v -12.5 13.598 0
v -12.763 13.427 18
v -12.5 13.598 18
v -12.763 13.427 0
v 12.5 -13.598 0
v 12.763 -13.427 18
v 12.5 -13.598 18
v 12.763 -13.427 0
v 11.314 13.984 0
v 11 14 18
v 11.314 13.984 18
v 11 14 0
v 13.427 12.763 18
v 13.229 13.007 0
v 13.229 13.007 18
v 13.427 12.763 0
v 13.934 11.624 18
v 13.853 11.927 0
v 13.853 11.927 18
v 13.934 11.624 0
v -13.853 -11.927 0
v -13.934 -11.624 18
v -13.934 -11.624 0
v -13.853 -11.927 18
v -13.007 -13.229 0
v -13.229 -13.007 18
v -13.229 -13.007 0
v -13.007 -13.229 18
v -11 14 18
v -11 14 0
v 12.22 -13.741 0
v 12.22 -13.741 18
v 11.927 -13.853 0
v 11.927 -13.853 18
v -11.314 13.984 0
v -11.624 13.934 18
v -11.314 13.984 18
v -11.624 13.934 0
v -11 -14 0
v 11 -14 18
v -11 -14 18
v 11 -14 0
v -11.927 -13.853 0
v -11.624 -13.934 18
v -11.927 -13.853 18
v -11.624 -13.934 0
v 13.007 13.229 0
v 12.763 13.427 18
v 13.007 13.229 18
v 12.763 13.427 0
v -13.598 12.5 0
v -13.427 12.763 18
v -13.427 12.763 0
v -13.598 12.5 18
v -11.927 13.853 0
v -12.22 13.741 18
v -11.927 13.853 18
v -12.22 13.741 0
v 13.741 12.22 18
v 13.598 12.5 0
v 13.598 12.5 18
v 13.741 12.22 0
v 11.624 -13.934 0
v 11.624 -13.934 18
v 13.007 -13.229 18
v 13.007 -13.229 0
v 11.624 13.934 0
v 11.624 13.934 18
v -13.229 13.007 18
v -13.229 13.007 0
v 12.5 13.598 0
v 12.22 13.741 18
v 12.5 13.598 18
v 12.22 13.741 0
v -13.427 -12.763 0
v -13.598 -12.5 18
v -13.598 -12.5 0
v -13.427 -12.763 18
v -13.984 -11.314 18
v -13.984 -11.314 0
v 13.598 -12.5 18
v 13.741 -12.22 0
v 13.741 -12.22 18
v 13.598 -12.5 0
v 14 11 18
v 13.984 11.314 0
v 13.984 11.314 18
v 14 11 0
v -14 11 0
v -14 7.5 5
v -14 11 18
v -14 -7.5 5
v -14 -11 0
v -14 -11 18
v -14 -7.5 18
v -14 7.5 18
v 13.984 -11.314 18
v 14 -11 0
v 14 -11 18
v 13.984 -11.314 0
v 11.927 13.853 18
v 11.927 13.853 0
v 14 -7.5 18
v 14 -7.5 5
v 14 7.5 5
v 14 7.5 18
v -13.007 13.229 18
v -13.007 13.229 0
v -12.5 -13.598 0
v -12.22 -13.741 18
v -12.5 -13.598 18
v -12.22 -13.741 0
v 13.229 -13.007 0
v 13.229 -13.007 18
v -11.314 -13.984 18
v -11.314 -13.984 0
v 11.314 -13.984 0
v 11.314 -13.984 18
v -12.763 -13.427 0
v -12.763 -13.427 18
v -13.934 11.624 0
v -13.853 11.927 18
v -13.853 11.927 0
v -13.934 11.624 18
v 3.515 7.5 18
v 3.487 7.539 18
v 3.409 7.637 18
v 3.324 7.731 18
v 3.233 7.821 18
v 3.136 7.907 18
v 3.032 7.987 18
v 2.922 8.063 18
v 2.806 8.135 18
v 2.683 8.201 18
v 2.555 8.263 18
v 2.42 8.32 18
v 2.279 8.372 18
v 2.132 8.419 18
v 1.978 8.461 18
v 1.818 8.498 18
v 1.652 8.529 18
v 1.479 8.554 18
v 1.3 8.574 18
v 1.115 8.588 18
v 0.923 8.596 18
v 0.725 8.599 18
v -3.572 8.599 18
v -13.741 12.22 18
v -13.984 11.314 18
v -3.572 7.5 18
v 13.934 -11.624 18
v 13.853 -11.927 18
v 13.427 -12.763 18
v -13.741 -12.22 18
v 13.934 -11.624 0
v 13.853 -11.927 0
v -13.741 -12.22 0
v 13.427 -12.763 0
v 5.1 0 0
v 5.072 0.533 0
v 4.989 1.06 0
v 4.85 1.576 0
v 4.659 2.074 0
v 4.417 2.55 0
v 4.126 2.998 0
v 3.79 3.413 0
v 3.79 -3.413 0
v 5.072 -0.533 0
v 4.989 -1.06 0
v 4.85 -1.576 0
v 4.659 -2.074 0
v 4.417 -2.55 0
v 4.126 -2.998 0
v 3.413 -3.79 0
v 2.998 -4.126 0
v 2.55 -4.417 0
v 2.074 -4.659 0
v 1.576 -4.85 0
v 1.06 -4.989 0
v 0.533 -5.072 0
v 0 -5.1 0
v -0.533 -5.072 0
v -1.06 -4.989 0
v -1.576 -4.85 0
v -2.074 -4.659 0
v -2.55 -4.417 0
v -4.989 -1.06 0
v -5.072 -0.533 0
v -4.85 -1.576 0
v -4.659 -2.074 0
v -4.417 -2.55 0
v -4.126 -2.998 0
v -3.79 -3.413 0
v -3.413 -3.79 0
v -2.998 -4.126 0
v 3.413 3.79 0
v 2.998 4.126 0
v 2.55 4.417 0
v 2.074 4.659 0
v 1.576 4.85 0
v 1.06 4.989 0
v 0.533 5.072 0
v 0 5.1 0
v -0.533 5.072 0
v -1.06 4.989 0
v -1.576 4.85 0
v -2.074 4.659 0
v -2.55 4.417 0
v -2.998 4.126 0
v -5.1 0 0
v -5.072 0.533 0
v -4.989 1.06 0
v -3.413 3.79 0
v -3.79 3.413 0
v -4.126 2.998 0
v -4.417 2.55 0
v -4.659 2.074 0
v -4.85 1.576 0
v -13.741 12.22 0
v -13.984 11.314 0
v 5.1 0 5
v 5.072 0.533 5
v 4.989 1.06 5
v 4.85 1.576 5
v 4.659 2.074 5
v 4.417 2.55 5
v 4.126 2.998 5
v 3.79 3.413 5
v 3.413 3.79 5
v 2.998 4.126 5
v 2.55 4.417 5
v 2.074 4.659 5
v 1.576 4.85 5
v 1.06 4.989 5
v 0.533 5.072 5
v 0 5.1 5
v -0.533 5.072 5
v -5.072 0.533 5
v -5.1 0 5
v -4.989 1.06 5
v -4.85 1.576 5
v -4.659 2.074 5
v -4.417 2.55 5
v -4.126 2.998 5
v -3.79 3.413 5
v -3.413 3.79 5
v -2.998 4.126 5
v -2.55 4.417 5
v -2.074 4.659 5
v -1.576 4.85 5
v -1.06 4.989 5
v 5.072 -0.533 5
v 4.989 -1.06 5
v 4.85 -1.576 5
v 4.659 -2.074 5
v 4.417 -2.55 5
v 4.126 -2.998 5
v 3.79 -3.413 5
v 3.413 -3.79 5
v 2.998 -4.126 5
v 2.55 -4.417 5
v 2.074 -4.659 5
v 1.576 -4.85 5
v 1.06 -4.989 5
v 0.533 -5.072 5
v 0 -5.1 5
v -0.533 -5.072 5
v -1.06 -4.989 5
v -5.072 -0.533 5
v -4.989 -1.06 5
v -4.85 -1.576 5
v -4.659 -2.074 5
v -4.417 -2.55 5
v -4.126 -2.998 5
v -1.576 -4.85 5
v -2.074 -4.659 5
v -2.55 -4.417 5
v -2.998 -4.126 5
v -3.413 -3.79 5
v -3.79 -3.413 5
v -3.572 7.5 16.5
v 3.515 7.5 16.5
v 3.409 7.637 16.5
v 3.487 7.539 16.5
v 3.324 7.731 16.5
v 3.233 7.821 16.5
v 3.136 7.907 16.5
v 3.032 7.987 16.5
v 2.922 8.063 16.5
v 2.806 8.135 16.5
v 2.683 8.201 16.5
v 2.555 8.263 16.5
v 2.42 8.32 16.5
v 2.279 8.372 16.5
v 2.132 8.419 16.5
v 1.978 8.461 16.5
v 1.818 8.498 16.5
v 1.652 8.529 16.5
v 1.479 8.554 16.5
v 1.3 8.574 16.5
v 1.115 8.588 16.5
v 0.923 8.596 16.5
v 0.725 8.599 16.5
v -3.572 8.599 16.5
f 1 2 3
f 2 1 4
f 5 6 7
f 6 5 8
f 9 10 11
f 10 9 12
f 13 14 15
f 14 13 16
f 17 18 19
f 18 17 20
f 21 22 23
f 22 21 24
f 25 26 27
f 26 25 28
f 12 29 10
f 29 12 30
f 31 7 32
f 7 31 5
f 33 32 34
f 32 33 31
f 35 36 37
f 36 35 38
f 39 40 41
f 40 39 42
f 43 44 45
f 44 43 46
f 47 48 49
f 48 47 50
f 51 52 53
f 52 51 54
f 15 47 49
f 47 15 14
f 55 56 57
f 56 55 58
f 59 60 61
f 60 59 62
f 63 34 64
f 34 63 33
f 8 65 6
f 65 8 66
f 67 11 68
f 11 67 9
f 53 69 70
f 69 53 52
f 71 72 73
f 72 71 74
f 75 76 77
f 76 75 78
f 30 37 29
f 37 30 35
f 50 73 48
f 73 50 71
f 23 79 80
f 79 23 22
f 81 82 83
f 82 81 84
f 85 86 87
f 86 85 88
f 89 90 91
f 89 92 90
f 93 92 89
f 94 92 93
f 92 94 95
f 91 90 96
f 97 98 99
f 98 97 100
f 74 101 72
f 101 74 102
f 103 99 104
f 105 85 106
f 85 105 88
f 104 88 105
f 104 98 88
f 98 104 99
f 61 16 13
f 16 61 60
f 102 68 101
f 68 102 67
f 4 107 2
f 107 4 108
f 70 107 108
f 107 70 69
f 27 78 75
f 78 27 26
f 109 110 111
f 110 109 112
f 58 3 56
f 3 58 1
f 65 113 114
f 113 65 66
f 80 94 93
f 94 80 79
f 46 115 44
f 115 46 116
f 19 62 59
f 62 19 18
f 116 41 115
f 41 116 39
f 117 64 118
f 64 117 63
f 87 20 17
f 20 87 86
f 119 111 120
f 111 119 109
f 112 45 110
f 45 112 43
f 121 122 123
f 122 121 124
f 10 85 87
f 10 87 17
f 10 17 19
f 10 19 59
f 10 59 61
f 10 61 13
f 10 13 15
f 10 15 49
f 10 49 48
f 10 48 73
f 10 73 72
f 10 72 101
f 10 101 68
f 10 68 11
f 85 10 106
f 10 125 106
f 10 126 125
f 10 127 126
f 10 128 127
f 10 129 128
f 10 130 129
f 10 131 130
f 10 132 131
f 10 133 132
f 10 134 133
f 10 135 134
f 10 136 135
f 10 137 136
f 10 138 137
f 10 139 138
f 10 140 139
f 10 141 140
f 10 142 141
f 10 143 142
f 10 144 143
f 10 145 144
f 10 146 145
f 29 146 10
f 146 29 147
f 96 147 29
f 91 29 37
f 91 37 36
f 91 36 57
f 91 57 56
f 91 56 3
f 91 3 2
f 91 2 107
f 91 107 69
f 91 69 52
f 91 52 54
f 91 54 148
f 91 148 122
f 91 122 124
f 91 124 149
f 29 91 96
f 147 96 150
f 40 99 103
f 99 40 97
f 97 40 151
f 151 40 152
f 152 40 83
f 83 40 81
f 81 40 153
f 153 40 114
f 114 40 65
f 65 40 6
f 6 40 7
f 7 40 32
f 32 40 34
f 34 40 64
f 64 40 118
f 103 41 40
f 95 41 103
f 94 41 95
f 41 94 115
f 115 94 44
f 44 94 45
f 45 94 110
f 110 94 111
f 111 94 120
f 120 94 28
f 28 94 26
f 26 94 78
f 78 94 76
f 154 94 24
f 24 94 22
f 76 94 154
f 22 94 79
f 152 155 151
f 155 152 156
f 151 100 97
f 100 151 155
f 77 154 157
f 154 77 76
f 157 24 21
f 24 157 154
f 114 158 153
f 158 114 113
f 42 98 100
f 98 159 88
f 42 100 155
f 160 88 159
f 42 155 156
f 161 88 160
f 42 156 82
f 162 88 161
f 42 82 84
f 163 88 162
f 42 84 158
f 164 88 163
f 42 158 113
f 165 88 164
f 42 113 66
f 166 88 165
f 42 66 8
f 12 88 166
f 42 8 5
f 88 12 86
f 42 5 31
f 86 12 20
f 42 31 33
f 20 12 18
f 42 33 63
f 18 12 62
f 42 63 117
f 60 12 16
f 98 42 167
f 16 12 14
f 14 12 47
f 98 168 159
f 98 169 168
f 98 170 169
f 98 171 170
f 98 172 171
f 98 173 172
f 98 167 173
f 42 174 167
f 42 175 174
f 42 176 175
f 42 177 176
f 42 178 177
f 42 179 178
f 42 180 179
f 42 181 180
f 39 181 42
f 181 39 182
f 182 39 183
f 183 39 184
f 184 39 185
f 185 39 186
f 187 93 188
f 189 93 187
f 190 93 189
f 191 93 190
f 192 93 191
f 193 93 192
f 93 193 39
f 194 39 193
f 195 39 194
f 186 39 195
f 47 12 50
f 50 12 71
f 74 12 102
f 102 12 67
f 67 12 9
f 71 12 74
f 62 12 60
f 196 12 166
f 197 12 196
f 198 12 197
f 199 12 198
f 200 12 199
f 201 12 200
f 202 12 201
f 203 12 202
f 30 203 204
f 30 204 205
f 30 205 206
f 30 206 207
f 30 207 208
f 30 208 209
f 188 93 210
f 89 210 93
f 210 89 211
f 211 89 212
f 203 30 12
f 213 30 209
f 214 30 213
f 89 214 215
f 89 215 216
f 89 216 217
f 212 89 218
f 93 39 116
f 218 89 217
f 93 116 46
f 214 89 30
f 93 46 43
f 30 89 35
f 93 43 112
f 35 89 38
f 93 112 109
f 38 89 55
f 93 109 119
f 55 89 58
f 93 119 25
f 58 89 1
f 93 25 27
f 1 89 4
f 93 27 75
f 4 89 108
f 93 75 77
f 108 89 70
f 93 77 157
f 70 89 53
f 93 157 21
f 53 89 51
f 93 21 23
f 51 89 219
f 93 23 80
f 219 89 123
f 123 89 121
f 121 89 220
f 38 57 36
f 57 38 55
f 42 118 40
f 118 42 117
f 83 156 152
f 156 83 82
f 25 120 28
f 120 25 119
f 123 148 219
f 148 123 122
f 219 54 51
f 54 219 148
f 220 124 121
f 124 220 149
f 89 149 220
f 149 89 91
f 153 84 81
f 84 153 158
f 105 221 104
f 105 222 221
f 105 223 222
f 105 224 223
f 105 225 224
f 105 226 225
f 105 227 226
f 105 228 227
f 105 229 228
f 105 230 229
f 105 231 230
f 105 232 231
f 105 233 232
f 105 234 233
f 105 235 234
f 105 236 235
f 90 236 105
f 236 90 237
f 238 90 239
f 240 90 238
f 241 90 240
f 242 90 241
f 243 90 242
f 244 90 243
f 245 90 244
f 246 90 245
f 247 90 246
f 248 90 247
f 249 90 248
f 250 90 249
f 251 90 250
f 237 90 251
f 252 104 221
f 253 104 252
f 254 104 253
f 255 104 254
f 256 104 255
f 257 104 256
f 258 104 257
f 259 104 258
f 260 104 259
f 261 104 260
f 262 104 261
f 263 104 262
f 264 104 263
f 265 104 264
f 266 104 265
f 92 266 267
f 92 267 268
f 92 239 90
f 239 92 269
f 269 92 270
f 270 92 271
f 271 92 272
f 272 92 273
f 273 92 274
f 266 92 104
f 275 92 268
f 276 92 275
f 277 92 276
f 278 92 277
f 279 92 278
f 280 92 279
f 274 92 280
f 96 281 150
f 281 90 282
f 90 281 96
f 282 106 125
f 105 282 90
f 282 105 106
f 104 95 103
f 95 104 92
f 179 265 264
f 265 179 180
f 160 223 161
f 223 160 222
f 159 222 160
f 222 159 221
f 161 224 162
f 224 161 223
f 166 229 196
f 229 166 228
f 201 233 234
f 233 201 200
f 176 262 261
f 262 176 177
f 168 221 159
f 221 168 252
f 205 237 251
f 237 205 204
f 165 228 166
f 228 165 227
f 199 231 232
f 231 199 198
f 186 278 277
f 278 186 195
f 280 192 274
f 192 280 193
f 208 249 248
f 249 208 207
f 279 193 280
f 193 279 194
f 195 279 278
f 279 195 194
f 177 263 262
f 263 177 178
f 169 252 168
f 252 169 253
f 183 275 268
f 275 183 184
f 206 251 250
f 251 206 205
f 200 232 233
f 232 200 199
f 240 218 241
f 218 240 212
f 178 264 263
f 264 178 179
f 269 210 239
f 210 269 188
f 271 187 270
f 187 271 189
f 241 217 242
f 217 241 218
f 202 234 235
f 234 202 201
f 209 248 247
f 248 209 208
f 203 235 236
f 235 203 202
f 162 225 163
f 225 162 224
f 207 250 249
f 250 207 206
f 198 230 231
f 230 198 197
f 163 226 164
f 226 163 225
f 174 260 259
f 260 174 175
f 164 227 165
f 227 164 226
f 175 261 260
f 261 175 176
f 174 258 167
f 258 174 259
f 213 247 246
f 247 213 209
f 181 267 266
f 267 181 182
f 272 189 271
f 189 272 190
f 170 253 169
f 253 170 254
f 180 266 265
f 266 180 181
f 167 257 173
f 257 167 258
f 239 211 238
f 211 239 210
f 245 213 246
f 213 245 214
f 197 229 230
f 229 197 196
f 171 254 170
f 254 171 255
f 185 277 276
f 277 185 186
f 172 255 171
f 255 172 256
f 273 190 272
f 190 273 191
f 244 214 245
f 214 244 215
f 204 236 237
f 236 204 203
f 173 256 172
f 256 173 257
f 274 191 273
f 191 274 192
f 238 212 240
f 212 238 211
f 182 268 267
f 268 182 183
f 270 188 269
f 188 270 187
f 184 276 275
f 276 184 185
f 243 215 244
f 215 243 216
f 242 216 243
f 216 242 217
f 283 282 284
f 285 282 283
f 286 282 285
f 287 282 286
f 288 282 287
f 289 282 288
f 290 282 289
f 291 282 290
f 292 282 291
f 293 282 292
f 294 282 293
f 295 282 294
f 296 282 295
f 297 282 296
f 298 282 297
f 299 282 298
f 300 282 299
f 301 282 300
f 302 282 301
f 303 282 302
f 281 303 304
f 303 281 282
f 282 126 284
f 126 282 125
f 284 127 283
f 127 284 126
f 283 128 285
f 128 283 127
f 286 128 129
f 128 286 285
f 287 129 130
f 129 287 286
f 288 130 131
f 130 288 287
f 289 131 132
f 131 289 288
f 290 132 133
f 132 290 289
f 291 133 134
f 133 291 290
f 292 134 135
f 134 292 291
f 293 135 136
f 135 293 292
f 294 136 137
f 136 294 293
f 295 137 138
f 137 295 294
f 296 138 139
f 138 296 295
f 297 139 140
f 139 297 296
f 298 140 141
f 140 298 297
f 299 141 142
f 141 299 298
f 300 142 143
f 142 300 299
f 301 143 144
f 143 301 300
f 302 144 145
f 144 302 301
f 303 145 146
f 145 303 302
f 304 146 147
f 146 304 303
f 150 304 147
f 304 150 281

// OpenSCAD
// V55 - The Master Hollow (Right Side)
// Designed for Shokz-style battery pods
$fn = 60;

difference() {
    // 1. THE MAIN BODY
    hull() {
        translate([-11, -11, 0]) cylinder(r=3, h=18);
        translate([11, -11, 0])  cylinder(r=3, h=18);
        translate([-11, 11, 0])  cylinder(r=3, h=18);
        translate([11, 11, 0])   cylinder(r=3, h=18);
    }

    // 2. THE BIG HOLLOW (This creates the CLIPS)
    // This removes the entire center of the block
    translate([-20, -7.5, 5]) 
        cube([40, 15, 20]); 

    // 3. THE MOTOR HOLE (Skin-Side)
    // This hole goes all the way through the bottom floor
    translate([0, 0, -2]) 
        cylinder(d=10.2, h=10);

    // 4. THE "R" MARKING
    translate([0, 0, 16.5]) 
        linear_extrude(height = 2) 
            text("R", size=9, font="Arial:style=Bold", halign="center");
}
